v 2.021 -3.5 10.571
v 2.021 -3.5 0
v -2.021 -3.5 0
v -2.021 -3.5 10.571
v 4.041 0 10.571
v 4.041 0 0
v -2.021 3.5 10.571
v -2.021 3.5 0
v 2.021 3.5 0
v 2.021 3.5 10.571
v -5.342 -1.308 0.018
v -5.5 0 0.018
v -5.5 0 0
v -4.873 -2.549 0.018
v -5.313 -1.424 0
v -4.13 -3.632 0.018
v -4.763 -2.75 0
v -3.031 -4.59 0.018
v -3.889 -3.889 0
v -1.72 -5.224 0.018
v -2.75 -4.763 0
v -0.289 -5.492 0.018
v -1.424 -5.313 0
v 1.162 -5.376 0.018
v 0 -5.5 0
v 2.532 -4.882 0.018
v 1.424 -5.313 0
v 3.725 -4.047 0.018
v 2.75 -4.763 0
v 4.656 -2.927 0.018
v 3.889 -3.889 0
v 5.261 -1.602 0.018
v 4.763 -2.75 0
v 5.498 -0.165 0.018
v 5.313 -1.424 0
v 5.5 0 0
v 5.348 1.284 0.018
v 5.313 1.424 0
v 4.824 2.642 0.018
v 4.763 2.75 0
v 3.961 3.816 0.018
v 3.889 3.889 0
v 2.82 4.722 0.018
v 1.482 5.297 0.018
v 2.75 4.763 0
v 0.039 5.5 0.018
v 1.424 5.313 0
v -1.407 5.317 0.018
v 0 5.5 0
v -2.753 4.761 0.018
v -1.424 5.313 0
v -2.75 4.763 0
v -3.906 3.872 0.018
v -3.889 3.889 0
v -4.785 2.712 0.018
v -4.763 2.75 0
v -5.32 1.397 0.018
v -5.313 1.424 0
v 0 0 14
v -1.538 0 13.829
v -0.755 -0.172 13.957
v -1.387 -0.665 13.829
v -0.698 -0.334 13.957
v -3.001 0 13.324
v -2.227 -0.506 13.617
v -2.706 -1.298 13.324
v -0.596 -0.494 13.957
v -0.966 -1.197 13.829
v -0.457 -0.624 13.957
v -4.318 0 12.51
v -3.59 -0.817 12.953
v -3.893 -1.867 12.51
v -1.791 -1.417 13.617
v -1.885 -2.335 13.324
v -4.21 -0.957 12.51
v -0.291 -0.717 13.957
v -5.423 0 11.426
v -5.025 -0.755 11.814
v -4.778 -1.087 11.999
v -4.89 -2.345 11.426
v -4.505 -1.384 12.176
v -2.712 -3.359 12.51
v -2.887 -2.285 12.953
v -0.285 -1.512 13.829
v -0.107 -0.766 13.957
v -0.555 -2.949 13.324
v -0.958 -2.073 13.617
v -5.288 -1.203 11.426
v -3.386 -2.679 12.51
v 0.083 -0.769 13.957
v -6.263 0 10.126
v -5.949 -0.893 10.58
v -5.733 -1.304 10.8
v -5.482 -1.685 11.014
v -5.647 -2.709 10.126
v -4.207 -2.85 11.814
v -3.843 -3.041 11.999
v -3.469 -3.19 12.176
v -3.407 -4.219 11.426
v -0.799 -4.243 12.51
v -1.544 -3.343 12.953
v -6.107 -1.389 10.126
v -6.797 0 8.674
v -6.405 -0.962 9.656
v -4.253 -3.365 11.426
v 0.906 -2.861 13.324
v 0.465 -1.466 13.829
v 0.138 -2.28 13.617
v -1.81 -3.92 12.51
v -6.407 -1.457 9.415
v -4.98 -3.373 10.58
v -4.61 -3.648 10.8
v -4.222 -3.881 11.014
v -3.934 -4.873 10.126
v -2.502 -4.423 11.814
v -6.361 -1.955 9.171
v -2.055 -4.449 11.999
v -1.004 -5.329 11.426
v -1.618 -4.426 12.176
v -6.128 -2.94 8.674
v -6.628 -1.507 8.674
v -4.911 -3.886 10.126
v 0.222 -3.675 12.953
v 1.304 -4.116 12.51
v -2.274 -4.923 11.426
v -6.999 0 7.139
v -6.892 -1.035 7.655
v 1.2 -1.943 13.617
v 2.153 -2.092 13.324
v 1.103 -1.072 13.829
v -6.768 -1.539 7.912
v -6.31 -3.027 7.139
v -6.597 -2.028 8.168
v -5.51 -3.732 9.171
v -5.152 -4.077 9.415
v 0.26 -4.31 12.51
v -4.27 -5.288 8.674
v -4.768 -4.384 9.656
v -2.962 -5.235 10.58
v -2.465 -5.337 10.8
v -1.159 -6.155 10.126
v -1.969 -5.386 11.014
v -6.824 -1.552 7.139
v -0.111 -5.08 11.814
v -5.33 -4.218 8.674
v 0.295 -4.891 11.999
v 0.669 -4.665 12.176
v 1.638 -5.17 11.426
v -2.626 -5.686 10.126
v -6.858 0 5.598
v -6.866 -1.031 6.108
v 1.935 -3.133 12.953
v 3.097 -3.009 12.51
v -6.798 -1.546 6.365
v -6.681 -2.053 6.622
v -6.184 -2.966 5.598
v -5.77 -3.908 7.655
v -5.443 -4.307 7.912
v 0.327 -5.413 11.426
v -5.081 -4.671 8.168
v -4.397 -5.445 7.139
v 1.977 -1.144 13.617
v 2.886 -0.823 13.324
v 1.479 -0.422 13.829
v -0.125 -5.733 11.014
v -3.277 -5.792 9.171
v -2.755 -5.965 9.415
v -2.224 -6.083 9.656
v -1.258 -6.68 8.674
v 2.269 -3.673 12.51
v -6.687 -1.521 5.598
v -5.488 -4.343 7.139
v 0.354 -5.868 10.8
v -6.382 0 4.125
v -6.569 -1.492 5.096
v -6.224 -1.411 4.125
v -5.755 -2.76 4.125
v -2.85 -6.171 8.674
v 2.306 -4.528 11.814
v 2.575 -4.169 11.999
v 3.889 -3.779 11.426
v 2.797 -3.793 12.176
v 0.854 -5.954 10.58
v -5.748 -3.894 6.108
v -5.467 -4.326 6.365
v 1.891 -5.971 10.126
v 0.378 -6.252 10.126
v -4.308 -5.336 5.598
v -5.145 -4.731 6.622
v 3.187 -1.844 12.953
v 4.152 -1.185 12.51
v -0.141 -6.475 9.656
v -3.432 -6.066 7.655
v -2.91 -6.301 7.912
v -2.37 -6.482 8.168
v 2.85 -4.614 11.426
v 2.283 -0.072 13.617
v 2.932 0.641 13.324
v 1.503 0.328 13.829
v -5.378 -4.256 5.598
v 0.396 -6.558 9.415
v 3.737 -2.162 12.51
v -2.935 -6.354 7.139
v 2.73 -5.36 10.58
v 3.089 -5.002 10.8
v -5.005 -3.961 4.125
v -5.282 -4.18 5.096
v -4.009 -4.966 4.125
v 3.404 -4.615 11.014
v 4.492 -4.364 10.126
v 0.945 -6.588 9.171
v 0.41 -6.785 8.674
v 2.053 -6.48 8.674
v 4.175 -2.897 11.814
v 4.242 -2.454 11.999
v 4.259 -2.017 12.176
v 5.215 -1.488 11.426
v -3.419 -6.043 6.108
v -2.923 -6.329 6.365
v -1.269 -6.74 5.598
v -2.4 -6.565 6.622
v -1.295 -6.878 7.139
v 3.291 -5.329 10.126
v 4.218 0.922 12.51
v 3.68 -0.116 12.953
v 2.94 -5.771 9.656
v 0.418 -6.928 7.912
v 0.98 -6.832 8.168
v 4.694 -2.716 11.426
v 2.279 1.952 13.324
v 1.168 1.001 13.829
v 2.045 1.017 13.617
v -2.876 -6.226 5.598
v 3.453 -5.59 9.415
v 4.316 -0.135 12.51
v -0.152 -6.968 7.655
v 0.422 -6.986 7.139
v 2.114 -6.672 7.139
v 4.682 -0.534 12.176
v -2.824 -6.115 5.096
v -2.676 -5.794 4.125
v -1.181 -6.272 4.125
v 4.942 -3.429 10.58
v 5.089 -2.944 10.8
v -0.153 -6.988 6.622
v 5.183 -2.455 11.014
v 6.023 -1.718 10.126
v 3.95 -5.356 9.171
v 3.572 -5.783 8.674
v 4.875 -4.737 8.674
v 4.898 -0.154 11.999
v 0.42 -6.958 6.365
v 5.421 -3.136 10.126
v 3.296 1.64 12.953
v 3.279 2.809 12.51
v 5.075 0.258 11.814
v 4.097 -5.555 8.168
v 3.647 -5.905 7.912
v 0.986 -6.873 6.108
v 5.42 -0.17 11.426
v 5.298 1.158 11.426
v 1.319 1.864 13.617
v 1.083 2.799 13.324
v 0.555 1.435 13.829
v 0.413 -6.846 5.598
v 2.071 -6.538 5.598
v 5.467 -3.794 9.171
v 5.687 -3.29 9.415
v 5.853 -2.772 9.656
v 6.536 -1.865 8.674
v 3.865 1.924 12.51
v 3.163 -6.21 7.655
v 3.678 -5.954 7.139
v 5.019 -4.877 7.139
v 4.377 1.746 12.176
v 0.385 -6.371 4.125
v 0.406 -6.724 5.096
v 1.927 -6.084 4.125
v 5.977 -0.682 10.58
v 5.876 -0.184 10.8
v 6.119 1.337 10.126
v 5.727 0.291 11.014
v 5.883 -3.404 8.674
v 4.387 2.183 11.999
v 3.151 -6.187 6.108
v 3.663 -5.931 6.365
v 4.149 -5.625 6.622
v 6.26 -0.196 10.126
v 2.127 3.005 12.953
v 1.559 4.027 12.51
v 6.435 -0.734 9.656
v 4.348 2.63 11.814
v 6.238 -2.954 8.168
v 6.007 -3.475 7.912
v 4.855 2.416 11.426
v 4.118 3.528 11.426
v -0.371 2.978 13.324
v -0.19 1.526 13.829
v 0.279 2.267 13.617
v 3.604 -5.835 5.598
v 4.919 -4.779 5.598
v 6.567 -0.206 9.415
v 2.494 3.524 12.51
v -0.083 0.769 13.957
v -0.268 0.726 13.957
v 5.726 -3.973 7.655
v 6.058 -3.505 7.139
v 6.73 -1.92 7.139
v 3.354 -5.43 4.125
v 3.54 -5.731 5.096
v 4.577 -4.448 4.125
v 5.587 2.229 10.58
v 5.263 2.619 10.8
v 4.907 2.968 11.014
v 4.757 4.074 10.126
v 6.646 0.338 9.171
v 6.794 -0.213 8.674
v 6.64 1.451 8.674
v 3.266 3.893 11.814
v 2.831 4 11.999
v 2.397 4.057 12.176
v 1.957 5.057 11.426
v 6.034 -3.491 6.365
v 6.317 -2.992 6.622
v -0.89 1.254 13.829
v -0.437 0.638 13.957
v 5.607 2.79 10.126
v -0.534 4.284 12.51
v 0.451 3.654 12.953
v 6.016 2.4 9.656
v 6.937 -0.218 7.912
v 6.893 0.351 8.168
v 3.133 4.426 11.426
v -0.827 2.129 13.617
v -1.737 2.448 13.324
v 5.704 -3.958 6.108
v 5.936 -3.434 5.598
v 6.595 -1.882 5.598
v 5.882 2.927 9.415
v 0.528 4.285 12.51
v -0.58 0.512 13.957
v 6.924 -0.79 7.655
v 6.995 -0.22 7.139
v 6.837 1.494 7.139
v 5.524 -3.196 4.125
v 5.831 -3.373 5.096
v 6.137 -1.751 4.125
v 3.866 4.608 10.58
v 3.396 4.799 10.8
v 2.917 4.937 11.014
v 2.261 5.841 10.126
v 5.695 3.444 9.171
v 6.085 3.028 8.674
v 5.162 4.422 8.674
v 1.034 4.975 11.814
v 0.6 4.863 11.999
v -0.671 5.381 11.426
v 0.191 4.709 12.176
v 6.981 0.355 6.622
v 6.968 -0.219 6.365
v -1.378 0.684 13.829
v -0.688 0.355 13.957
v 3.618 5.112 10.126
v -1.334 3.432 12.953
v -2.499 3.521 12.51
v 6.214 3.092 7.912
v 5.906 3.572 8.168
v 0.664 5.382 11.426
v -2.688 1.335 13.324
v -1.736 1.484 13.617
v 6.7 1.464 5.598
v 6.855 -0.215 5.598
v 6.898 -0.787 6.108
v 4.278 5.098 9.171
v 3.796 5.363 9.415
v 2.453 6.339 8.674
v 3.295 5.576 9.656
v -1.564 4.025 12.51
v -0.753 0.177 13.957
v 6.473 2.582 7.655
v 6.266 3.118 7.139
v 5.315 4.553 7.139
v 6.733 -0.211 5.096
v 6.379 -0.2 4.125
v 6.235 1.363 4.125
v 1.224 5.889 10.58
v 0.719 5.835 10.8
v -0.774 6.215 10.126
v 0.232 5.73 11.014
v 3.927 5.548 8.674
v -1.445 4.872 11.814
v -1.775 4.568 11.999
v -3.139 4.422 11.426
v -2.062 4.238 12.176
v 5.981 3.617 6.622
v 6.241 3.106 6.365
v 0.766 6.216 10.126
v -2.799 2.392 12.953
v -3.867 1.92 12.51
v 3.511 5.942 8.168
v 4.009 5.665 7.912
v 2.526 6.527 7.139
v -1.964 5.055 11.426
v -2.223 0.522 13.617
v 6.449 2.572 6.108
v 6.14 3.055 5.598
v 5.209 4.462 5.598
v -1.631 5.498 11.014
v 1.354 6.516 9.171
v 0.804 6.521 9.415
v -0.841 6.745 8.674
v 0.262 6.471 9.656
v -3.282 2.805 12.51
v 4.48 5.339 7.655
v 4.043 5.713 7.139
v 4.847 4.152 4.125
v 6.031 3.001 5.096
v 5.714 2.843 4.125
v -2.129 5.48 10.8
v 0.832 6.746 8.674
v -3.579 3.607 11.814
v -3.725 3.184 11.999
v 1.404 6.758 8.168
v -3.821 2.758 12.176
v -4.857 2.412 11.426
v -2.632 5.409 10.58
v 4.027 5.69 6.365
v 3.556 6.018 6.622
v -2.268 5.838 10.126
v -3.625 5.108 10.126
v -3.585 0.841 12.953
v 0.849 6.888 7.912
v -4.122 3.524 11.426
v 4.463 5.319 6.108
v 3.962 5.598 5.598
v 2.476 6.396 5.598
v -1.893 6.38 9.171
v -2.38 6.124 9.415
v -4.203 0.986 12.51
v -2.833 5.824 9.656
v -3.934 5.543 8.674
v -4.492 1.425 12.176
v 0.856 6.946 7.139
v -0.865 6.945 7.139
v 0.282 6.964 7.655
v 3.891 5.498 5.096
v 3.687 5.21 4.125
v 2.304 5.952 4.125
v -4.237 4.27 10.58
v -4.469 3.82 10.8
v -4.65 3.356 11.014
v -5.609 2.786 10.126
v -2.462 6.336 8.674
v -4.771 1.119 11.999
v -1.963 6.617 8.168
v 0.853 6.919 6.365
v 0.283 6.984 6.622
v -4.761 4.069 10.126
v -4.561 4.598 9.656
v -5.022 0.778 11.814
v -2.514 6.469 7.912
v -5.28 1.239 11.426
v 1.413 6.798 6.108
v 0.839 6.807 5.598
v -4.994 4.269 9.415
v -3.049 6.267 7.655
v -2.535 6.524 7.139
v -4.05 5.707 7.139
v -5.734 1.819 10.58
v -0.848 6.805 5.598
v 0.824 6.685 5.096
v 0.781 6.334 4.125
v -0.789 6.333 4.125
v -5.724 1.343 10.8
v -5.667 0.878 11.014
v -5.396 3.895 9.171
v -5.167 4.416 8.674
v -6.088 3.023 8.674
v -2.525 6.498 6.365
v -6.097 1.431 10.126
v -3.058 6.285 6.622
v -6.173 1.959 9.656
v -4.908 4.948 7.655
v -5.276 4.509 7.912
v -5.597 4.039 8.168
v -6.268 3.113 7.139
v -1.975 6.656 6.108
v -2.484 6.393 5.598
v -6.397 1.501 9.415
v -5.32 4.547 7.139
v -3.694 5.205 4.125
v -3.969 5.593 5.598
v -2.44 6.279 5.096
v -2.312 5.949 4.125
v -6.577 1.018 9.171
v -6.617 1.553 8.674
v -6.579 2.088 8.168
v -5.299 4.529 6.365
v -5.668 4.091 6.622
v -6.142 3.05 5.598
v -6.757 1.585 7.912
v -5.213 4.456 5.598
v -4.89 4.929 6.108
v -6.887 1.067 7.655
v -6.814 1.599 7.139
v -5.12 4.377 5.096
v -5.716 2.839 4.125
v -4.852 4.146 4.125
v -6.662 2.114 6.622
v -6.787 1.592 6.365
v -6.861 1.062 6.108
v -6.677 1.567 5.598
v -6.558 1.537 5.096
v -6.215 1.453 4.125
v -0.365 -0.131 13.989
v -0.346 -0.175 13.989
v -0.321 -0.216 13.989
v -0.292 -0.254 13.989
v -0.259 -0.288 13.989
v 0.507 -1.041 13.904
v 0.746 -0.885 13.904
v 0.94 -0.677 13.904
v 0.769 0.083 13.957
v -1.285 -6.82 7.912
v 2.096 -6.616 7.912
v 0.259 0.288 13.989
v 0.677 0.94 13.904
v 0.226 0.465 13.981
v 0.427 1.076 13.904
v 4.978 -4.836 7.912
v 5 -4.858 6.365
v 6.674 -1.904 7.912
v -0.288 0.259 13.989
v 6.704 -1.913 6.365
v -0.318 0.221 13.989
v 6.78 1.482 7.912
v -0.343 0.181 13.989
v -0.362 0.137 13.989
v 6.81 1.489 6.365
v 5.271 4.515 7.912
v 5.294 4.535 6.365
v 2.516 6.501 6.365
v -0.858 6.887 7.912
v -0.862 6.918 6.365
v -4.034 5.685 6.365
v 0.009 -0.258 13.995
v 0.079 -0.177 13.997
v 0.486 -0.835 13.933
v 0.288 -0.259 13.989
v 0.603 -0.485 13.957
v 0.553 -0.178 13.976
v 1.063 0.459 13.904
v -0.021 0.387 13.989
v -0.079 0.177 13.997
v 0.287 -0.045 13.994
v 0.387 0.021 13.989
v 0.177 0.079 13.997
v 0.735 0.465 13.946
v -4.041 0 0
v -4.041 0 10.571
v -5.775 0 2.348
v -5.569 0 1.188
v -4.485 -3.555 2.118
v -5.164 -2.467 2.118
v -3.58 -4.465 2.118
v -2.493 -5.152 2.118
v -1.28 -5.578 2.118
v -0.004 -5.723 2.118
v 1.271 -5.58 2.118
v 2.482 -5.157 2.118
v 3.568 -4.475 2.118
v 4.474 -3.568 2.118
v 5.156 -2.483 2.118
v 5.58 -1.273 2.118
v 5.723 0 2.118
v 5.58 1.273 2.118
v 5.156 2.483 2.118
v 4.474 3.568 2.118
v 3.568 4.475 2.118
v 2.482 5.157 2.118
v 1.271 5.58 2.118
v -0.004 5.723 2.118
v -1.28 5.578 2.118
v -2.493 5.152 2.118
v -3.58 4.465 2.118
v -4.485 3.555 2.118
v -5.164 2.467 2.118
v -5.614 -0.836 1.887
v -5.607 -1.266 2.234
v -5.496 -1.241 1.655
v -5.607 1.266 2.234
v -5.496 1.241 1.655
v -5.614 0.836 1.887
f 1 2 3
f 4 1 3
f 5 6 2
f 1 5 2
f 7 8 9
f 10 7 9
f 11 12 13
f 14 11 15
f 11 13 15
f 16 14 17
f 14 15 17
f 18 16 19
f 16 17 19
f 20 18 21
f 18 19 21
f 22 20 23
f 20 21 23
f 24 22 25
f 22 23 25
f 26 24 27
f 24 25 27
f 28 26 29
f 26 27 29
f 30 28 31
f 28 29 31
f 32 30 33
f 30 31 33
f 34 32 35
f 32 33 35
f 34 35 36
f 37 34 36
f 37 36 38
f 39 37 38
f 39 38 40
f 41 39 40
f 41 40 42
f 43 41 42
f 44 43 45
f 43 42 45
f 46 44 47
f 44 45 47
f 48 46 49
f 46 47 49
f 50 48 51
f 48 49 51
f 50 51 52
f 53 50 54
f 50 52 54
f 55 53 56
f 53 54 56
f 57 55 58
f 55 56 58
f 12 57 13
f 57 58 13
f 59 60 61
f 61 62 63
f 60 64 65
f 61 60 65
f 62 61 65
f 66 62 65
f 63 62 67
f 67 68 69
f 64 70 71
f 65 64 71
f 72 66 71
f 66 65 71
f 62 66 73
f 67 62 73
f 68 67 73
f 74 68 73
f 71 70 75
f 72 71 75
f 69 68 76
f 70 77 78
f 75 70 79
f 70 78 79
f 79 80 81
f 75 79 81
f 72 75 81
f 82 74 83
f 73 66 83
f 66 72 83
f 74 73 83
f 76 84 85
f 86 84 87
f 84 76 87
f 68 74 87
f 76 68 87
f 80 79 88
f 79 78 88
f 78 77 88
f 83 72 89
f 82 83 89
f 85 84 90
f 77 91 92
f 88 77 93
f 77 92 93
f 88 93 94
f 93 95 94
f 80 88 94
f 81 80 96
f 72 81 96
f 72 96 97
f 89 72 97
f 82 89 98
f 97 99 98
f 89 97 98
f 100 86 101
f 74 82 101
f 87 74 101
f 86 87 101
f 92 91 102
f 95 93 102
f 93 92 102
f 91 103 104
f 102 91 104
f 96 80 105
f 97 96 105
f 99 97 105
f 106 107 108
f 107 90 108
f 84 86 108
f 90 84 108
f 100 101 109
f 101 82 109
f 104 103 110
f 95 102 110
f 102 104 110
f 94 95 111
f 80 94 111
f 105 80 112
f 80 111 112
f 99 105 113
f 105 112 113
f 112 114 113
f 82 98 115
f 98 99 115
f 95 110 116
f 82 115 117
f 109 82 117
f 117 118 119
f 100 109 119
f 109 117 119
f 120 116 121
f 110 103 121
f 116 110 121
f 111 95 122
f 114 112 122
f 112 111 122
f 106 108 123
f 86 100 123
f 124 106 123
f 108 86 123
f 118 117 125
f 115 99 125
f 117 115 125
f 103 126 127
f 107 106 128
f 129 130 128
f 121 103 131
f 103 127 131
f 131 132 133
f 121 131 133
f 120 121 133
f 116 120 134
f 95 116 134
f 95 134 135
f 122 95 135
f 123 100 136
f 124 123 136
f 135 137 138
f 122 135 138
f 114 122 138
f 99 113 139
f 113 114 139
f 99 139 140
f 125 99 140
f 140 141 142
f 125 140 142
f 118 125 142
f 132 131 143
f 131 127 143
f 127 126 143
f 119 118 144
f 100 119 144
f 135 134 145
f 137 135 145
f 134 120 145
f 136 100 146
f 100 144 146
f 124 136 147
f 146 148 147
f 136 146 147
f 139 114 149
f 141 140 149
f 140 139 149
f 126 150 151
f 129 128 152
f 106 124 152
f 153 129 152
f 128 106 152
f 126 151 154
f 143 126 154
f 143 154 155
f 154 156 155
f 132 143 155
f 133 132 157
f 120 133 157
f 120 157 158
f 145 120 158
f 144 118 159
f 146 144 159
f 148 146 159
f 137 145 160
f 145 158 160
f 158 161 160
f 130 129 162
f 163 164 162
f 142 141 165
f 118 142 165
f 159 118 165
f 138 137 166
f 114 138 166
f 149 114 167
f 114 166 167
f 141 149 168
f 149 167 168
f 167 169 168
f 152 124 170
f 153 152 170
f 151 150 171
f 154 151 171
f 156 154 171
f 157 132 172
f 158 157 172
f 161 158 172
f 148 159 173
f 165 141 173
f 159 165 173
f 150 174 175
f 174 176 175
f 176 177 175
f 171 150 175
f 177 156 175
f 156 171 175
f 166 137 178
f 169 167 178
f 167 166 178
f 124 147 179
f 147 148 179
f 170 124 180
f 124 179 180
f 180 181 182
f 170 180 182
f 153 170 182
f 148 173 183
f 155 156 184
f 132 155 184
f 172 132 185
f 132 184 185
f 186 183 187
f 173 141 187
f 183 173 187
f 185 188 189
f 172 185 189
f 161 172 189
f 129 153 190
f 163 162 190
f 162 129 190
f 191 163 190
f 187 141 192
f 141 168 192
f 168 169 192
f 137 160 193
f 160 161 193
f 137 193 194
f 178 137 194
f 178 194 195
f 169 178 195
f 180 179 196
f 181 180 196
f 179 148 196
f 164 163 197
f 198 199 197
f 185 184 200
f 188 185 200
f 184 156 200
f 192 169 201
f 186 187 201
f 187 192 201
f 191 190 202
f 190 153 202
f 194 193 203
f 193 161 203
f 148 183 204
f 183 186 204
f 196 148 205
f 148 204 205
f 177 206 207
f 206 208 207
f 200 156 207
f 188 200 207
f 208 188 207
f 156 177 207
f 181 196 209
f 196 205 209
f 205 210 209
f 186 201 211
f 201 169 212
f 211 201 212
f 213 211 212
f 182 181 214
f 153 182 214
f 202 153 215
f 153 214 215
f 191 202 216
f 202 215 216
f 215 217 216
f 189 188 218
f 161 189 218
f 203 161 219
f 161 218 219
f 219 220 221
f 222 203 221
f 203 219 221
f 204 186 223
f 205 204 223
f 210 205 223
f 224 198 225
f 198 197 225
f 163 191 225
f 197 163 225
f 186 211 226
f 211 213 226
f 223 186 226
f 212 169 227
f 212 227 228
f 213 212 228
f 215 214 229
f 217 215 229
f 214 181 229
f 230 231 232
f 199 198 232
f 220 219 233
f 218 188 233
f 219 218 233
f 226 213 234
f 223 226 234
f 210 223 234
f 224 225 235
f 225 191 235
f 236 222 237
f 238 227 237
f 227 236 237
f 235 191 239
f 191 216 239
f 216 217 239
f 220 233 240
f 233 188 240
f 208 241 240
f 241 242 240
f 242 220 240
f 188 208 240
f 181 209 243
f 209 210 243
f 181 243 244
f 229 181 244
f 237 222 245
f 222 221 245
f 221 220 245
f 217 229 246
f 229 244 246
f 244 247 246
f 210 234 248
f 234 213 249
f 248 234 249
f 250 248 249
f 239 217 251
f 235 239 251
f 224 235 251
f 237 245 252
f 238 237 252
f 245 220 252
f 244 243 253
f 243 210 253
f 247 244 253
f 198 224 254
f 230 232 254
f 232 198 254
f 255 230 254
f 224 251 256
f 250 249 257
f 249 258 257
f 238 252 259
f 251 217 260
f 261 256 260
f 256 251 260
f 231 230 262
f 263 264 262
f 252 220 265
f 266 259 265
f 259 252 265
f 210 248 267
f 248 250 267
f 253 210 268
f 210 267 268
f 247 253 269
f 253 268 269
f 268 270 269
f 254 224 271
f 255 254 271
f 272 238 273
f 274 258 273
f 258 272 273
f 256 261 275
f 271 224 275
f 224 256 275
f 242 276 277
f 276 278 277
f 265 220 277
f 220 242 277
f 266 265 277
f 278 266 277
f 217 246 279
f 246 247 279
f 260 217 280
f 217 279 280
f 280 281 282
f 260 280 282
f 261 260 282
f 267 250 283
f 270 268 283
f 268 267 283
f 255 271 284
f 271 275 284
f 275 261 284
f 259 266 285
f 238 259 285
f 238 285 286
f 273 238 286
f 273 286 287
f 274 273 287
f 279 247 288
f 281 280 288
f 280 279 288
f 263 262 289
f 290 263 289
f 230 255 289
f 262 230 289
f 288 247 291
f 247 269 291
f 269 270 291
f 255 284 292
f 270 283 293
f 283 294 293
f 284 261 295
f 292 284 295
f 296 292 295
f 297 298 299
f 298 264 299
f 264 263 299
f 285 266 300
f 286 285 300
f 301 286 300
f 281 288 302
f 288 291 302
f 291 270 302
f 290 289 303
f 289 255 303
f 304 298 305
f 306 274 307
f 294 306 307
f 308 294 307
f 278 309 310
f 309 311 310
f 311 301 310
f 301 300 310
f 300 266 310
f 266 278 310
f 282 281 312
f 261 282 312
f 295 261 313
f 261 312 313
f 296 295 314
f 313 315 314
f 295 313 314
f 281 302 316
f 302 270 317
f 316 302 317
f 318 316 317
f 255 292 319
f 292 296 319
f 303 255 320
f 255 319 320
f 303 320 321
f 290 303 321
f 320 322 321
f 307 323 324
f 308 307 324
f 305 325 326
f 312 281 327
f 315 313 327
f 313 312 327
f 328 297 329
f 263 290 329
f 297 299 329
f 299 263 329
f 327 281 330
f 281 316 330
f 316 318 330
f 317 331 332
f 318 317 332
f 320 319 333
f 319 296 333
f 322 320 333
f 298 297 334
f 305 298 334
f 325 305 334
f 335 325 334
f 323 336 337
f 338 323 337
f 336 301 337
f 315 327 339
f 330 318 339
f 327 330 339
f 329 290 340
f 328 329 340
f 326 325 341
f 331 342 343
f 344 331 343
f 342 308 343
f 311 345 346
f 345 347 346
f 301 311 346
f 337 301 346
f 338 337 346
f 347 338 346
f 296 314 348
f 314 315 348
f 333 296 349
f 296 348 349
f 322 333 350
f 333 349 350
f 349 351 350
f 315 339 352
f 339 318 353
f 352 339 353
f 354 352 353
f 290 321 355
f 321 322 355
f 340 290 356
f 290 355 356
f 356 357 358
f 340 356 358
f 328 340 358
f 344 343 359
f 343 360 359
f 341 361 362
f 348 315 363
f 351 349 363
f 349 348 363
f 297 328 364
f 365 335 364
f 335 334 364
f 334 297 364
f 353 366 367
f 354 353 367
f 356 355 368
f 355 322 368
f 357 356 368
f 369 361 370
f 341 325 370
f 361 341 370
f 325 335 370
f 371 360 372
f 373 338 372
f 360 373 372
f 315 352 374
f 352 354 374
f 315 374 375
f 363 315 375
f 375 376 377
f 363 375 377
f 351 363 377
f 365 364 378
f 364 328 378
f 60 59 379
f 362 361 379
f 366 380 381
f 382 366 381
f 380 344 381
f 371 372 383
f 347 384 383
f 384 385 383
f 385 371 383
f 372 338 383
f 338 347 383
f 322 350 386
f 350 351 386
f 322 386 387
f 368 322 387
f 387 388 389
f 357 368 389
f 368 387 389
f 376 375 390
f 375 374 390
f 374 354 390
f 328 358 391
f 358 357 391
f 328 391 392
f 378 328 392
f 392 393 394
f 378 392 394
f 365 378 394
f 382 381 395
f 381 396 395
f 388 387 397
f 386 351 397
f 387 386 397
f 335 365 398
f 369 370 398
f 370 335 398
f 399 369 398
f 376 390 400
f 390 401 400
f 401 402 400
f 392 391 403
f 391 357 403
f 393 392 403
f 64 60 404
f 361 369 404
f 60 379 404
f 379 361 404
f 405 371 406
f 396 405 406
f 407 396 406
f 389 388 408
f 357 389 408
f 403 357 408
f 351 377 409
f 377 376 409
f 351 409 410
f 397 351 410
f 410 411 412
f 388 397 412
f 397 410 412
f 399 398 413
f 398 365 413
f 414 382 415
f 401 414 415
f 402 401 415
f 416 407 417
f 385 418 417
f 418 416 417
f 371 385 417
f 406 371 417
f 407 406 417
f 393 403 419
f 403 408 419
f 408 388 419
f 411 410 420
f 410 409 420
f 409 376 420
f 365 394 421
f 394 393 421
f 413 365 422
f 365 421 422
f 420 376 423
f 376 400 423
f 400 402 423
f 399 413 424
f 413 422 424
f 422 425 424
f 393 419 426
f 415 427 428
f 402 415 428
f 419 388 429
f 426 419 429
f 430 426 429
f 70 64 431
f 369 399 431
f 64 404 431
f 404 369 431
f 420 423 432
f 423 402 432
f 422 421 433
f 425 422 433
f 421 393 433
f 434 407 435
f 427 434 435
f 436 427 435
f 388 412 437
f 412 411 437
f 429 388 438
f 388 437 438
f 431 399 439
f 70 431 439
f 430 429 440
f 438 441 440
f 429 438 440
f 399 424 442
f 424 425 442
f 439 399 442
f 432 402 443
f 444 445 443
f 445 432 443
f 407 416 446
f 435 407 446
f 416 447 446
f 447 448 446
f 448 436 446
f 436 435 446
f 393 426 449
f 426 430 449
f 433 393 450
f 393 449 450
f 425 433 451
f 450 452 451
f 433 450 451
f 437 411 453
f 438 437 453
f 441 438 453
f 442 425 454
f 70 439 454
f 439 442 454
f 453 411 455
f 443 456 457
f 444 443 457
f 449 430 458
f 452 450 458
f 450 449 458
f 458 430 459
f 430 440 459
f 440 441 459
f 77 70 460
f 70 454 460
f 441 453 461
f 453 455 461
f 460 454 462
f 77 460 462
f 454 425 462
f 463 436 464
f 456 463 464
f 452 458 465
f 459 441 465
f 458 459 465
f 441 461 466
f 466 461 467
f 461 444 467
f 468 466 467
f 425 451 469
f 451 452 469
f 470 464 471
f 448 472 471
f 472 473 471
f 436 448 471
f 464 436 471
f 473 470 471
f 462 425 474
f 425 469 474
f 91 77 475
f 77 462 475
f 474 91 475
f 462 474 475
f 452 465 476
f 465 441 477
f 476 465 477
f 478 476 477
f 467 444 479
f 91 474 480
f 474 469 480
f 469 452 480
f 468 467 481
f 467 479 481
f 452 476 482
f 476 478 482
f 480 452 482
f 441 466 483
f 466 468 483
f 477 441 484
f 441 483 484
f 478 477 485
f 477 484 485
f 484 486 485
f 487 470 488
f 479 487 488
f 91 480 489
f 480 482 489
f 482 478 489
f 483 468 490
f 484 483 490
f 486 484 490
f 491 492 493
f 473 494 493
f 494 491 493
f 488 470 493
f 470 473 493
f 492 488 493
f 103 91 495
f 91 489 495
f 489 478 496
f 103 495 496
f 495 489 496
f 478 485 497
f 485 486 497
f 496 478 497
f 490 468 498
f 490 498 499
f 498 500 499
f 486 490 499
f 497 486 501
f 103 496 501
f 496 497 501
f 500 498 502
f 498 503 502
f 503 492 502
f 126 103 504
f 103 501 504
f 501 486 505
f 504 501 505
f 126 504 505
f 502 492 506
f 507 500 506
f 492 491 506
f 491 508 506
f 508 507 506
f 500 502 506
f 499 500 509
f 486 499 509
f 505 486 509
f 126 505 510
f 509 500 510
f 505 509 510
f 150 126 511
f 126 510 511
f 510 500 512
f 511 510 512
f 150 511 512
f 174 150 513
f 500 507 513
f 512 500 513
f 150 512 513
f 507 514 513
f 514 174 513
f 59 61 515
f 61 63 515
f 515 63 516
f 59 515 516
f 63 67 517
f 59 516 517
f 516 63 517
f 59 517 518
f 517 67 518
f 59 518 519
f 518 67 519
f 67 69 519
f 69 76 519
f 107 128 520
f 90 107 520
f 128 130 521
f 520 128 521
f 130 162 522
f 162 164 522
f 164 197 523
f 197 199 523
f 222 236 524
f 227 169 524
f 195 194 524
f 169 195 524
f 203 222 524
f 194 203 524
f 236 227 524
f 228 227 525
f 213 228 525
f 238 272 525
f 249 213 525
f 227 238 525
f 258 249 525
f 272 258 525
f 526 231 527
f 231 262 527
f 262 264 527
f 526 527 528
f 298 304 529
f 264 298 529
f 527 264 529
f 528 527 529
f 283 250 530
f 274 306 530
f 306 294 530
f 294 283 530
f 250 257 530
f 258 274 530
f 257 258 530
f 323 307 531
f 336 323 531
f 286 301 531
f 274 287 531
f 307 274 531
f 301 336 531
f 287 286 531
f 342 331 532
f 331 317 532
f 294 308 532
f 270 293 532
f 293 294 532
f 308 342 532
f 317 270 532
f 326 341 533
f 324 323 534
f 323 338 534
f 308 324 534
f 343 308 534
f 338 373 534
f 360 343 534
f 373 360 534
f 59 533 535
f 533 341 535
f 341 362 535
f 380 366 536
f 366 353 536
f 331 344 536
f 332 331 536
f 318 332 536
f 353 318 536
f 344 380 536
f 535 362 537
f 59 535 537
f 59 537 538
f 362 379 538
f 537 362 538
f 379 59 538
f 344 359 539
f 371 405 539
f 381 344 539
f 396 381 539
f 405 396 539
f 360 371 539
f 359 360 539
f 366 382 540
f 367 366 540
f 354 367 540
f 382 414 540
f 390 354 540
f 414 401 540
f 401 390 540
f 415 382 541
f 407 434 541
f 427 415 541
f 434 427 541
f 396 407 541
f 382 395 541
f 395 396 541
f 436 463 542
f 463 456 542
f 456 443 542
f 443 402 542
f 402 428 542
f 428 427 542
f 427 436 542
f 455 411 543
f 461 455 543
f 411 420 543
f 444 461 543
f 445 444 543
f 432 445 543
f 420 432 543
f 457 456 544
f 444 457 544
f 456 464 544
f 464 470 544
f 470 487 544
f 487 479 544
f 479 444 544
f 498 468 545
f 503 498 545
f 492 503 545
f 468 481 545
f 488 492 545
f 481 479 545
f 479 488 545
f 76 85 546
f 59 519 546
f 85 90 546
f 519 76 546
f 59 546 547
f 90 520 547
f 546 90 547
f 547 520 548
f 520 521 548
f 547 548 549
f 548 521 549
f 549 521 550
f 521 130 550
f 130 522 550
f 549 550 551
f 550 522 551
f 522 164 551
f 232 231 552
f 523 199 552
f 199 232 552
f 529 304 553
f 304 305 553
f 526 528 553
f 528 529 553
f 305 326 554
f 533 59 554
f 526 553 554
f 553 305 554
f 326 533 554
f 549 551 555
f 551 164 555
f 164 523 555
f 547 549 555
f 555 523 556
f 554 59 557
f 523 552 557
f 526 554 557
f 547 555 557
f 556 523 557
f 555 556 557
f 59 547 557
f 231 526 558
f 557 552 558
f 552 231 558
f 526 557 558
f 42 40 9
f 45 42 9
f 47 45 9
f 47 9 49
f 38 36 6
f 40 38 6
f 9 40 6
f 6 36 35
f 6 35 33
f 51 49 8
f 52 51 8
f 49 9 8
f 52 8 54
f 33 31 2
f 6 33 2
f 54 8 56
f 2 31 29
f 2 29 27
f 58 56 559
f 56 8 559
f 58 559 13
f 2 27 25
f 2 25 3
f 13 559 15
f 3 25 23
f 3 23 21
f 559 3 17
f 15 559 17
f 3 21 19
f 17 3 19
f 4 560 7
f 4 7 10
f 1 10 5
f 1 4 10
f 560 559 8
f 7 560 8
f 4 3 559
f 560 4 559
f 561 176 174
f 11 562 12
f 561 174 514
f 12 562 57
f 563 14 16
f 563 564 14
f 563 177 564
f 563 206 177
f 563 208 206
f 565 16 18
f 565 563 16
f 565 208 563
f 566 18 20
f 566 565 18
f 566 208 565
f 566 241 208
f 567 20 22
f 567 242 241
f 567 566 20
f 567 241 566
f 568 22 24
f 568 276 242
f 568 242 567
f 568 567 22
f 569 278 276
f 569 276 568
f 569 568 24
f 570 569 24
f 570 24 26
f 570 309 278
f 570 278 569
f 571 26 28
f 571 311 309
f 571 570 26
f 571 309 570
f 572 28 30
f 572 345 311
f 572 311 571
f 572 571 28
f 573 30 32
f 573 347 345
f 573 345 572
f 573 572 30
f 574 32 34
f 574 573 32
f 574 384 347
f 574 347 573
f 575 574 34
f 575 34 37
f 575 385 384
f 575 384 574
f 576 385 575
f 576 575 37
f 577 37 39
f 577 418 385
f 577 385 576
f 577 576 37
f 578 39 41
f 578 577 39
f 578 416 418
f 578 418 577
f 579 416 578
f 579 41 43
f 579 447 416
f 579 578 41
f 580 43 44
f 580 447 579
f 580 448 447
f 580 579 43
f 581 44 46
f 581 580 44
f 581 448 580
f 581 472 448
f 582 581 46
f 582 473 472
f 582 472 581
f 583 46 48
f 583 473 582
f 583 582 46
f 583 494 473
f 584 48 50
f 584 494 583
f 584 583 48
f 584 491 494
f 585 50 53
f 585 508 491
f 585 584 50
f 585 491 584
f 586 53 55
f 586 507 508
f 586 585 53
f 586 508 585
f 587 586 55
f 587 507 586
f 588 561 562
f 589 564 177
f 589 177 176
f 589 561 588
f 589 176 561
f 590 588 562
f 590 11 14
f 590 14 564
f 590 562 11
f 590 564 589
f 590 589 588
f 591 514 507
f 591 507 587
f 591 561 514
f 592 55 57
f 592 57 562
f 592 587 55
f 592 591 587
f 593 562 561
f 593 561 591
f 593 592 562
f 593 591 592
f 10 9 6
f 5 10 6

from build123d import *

# Parameters (mm, degrees)
F3_DEPTH = 10.570714
F4_R     = 10


with BuildPart() as f1:
    # F0 (on Front) → F1 (revolve)
    with BuildSketch(Plane.XZ):
        with BuildLine():
            Line((0, 10.570714), (0, 14))
            ThreePointArc((0, 14), (-6.297257, 10.056887), (-5.5, 2.669873))
            Line((-5.5, 2.669873), (-5.5, 0))
            Line((-5.5, 0), (-3.5, 0))
            Line((-3.5, 0), (-3.5, 10.570714))
            Line((-3.5, 10.570714), (0, 10.570714))
        make_face()
    revolve(axis=Axis((0, 0, 5.285357), (0, 0, 1)))

    # F2 (on face) → F3 (cut, through all)
    with BuildSketch(Plane(origin=(0, 0, 0), x_dir=(1, 0, 0), z_dir=(0, 0, -1))):
        with BuildLine():
            Line((-2.020726, -3.5), (0, -3.5))
            ThreePointArc((0, -3.5), (-1.75, -3.031089), (-3.031089, -1.75))
            Line((-3.031089, -1.75), (-2.020726, -3.5))
        make_face()
        with BuildLine():
            Line((-4.041452, 0), (-3.031089, -1.75))
            ThreePointArc((-3.031089, -1.75), (-3.5, 0), (-3.031089, 1.75))
            Line((-3.031089, 1.75), (-4.041452, 0))
        make_face()
        with BuildLine():
            Line((-2.020726, 3.5), (-3.031089, 1.75))
            ThreePointArc((-3.031089, 1.75), (-1.75, 3.031089), (0, 3.5))
            Line((0, 3.5), (-2.020726, 3.5))
        make_face()
        with BuildLine():
            ThreePointArc((0, 3.5), (1.75, 3.031089), (3.031089, 1.75))
            Line((3.031089, 1.75), (2.020726, 3.5))
            Line((2.020726, 3.5), (0, 3.5))
        make_face()
        with BuildLine():
            ThreePointArc((3.5, 0), (3.38074, -0.905867), (3.031089, -1.75))
            Line((3.031089, -1.75), (4.041452, 0))
            Line((4.041452, 0), (3.031089, 1.75))
            ThreePointArc((3.031089, 1.75), (3.38074, 0.905867), (3.5, 0))
        make_face()
        with BuildLine():
            Line((0, -3.5), (2.020726, -3.5))
            Line((2.020726, -3.5), (3.031089, -1.75))
            ThreePointArc((3.031089, -1.75), (1.75, -3.031089), (0, -3.5))
        make_face()
    extrude(amount=-F3_DEPTH, mode=Mode.SUBTRACT)

    # F4
    f4_edges = [f1.edges().sort_by_distance(p)[0] for p in [
        (5.5, 0, 2.669873),
    ]]
    fillet(f4_edges, radius=F4_R)


solid = f1.part
